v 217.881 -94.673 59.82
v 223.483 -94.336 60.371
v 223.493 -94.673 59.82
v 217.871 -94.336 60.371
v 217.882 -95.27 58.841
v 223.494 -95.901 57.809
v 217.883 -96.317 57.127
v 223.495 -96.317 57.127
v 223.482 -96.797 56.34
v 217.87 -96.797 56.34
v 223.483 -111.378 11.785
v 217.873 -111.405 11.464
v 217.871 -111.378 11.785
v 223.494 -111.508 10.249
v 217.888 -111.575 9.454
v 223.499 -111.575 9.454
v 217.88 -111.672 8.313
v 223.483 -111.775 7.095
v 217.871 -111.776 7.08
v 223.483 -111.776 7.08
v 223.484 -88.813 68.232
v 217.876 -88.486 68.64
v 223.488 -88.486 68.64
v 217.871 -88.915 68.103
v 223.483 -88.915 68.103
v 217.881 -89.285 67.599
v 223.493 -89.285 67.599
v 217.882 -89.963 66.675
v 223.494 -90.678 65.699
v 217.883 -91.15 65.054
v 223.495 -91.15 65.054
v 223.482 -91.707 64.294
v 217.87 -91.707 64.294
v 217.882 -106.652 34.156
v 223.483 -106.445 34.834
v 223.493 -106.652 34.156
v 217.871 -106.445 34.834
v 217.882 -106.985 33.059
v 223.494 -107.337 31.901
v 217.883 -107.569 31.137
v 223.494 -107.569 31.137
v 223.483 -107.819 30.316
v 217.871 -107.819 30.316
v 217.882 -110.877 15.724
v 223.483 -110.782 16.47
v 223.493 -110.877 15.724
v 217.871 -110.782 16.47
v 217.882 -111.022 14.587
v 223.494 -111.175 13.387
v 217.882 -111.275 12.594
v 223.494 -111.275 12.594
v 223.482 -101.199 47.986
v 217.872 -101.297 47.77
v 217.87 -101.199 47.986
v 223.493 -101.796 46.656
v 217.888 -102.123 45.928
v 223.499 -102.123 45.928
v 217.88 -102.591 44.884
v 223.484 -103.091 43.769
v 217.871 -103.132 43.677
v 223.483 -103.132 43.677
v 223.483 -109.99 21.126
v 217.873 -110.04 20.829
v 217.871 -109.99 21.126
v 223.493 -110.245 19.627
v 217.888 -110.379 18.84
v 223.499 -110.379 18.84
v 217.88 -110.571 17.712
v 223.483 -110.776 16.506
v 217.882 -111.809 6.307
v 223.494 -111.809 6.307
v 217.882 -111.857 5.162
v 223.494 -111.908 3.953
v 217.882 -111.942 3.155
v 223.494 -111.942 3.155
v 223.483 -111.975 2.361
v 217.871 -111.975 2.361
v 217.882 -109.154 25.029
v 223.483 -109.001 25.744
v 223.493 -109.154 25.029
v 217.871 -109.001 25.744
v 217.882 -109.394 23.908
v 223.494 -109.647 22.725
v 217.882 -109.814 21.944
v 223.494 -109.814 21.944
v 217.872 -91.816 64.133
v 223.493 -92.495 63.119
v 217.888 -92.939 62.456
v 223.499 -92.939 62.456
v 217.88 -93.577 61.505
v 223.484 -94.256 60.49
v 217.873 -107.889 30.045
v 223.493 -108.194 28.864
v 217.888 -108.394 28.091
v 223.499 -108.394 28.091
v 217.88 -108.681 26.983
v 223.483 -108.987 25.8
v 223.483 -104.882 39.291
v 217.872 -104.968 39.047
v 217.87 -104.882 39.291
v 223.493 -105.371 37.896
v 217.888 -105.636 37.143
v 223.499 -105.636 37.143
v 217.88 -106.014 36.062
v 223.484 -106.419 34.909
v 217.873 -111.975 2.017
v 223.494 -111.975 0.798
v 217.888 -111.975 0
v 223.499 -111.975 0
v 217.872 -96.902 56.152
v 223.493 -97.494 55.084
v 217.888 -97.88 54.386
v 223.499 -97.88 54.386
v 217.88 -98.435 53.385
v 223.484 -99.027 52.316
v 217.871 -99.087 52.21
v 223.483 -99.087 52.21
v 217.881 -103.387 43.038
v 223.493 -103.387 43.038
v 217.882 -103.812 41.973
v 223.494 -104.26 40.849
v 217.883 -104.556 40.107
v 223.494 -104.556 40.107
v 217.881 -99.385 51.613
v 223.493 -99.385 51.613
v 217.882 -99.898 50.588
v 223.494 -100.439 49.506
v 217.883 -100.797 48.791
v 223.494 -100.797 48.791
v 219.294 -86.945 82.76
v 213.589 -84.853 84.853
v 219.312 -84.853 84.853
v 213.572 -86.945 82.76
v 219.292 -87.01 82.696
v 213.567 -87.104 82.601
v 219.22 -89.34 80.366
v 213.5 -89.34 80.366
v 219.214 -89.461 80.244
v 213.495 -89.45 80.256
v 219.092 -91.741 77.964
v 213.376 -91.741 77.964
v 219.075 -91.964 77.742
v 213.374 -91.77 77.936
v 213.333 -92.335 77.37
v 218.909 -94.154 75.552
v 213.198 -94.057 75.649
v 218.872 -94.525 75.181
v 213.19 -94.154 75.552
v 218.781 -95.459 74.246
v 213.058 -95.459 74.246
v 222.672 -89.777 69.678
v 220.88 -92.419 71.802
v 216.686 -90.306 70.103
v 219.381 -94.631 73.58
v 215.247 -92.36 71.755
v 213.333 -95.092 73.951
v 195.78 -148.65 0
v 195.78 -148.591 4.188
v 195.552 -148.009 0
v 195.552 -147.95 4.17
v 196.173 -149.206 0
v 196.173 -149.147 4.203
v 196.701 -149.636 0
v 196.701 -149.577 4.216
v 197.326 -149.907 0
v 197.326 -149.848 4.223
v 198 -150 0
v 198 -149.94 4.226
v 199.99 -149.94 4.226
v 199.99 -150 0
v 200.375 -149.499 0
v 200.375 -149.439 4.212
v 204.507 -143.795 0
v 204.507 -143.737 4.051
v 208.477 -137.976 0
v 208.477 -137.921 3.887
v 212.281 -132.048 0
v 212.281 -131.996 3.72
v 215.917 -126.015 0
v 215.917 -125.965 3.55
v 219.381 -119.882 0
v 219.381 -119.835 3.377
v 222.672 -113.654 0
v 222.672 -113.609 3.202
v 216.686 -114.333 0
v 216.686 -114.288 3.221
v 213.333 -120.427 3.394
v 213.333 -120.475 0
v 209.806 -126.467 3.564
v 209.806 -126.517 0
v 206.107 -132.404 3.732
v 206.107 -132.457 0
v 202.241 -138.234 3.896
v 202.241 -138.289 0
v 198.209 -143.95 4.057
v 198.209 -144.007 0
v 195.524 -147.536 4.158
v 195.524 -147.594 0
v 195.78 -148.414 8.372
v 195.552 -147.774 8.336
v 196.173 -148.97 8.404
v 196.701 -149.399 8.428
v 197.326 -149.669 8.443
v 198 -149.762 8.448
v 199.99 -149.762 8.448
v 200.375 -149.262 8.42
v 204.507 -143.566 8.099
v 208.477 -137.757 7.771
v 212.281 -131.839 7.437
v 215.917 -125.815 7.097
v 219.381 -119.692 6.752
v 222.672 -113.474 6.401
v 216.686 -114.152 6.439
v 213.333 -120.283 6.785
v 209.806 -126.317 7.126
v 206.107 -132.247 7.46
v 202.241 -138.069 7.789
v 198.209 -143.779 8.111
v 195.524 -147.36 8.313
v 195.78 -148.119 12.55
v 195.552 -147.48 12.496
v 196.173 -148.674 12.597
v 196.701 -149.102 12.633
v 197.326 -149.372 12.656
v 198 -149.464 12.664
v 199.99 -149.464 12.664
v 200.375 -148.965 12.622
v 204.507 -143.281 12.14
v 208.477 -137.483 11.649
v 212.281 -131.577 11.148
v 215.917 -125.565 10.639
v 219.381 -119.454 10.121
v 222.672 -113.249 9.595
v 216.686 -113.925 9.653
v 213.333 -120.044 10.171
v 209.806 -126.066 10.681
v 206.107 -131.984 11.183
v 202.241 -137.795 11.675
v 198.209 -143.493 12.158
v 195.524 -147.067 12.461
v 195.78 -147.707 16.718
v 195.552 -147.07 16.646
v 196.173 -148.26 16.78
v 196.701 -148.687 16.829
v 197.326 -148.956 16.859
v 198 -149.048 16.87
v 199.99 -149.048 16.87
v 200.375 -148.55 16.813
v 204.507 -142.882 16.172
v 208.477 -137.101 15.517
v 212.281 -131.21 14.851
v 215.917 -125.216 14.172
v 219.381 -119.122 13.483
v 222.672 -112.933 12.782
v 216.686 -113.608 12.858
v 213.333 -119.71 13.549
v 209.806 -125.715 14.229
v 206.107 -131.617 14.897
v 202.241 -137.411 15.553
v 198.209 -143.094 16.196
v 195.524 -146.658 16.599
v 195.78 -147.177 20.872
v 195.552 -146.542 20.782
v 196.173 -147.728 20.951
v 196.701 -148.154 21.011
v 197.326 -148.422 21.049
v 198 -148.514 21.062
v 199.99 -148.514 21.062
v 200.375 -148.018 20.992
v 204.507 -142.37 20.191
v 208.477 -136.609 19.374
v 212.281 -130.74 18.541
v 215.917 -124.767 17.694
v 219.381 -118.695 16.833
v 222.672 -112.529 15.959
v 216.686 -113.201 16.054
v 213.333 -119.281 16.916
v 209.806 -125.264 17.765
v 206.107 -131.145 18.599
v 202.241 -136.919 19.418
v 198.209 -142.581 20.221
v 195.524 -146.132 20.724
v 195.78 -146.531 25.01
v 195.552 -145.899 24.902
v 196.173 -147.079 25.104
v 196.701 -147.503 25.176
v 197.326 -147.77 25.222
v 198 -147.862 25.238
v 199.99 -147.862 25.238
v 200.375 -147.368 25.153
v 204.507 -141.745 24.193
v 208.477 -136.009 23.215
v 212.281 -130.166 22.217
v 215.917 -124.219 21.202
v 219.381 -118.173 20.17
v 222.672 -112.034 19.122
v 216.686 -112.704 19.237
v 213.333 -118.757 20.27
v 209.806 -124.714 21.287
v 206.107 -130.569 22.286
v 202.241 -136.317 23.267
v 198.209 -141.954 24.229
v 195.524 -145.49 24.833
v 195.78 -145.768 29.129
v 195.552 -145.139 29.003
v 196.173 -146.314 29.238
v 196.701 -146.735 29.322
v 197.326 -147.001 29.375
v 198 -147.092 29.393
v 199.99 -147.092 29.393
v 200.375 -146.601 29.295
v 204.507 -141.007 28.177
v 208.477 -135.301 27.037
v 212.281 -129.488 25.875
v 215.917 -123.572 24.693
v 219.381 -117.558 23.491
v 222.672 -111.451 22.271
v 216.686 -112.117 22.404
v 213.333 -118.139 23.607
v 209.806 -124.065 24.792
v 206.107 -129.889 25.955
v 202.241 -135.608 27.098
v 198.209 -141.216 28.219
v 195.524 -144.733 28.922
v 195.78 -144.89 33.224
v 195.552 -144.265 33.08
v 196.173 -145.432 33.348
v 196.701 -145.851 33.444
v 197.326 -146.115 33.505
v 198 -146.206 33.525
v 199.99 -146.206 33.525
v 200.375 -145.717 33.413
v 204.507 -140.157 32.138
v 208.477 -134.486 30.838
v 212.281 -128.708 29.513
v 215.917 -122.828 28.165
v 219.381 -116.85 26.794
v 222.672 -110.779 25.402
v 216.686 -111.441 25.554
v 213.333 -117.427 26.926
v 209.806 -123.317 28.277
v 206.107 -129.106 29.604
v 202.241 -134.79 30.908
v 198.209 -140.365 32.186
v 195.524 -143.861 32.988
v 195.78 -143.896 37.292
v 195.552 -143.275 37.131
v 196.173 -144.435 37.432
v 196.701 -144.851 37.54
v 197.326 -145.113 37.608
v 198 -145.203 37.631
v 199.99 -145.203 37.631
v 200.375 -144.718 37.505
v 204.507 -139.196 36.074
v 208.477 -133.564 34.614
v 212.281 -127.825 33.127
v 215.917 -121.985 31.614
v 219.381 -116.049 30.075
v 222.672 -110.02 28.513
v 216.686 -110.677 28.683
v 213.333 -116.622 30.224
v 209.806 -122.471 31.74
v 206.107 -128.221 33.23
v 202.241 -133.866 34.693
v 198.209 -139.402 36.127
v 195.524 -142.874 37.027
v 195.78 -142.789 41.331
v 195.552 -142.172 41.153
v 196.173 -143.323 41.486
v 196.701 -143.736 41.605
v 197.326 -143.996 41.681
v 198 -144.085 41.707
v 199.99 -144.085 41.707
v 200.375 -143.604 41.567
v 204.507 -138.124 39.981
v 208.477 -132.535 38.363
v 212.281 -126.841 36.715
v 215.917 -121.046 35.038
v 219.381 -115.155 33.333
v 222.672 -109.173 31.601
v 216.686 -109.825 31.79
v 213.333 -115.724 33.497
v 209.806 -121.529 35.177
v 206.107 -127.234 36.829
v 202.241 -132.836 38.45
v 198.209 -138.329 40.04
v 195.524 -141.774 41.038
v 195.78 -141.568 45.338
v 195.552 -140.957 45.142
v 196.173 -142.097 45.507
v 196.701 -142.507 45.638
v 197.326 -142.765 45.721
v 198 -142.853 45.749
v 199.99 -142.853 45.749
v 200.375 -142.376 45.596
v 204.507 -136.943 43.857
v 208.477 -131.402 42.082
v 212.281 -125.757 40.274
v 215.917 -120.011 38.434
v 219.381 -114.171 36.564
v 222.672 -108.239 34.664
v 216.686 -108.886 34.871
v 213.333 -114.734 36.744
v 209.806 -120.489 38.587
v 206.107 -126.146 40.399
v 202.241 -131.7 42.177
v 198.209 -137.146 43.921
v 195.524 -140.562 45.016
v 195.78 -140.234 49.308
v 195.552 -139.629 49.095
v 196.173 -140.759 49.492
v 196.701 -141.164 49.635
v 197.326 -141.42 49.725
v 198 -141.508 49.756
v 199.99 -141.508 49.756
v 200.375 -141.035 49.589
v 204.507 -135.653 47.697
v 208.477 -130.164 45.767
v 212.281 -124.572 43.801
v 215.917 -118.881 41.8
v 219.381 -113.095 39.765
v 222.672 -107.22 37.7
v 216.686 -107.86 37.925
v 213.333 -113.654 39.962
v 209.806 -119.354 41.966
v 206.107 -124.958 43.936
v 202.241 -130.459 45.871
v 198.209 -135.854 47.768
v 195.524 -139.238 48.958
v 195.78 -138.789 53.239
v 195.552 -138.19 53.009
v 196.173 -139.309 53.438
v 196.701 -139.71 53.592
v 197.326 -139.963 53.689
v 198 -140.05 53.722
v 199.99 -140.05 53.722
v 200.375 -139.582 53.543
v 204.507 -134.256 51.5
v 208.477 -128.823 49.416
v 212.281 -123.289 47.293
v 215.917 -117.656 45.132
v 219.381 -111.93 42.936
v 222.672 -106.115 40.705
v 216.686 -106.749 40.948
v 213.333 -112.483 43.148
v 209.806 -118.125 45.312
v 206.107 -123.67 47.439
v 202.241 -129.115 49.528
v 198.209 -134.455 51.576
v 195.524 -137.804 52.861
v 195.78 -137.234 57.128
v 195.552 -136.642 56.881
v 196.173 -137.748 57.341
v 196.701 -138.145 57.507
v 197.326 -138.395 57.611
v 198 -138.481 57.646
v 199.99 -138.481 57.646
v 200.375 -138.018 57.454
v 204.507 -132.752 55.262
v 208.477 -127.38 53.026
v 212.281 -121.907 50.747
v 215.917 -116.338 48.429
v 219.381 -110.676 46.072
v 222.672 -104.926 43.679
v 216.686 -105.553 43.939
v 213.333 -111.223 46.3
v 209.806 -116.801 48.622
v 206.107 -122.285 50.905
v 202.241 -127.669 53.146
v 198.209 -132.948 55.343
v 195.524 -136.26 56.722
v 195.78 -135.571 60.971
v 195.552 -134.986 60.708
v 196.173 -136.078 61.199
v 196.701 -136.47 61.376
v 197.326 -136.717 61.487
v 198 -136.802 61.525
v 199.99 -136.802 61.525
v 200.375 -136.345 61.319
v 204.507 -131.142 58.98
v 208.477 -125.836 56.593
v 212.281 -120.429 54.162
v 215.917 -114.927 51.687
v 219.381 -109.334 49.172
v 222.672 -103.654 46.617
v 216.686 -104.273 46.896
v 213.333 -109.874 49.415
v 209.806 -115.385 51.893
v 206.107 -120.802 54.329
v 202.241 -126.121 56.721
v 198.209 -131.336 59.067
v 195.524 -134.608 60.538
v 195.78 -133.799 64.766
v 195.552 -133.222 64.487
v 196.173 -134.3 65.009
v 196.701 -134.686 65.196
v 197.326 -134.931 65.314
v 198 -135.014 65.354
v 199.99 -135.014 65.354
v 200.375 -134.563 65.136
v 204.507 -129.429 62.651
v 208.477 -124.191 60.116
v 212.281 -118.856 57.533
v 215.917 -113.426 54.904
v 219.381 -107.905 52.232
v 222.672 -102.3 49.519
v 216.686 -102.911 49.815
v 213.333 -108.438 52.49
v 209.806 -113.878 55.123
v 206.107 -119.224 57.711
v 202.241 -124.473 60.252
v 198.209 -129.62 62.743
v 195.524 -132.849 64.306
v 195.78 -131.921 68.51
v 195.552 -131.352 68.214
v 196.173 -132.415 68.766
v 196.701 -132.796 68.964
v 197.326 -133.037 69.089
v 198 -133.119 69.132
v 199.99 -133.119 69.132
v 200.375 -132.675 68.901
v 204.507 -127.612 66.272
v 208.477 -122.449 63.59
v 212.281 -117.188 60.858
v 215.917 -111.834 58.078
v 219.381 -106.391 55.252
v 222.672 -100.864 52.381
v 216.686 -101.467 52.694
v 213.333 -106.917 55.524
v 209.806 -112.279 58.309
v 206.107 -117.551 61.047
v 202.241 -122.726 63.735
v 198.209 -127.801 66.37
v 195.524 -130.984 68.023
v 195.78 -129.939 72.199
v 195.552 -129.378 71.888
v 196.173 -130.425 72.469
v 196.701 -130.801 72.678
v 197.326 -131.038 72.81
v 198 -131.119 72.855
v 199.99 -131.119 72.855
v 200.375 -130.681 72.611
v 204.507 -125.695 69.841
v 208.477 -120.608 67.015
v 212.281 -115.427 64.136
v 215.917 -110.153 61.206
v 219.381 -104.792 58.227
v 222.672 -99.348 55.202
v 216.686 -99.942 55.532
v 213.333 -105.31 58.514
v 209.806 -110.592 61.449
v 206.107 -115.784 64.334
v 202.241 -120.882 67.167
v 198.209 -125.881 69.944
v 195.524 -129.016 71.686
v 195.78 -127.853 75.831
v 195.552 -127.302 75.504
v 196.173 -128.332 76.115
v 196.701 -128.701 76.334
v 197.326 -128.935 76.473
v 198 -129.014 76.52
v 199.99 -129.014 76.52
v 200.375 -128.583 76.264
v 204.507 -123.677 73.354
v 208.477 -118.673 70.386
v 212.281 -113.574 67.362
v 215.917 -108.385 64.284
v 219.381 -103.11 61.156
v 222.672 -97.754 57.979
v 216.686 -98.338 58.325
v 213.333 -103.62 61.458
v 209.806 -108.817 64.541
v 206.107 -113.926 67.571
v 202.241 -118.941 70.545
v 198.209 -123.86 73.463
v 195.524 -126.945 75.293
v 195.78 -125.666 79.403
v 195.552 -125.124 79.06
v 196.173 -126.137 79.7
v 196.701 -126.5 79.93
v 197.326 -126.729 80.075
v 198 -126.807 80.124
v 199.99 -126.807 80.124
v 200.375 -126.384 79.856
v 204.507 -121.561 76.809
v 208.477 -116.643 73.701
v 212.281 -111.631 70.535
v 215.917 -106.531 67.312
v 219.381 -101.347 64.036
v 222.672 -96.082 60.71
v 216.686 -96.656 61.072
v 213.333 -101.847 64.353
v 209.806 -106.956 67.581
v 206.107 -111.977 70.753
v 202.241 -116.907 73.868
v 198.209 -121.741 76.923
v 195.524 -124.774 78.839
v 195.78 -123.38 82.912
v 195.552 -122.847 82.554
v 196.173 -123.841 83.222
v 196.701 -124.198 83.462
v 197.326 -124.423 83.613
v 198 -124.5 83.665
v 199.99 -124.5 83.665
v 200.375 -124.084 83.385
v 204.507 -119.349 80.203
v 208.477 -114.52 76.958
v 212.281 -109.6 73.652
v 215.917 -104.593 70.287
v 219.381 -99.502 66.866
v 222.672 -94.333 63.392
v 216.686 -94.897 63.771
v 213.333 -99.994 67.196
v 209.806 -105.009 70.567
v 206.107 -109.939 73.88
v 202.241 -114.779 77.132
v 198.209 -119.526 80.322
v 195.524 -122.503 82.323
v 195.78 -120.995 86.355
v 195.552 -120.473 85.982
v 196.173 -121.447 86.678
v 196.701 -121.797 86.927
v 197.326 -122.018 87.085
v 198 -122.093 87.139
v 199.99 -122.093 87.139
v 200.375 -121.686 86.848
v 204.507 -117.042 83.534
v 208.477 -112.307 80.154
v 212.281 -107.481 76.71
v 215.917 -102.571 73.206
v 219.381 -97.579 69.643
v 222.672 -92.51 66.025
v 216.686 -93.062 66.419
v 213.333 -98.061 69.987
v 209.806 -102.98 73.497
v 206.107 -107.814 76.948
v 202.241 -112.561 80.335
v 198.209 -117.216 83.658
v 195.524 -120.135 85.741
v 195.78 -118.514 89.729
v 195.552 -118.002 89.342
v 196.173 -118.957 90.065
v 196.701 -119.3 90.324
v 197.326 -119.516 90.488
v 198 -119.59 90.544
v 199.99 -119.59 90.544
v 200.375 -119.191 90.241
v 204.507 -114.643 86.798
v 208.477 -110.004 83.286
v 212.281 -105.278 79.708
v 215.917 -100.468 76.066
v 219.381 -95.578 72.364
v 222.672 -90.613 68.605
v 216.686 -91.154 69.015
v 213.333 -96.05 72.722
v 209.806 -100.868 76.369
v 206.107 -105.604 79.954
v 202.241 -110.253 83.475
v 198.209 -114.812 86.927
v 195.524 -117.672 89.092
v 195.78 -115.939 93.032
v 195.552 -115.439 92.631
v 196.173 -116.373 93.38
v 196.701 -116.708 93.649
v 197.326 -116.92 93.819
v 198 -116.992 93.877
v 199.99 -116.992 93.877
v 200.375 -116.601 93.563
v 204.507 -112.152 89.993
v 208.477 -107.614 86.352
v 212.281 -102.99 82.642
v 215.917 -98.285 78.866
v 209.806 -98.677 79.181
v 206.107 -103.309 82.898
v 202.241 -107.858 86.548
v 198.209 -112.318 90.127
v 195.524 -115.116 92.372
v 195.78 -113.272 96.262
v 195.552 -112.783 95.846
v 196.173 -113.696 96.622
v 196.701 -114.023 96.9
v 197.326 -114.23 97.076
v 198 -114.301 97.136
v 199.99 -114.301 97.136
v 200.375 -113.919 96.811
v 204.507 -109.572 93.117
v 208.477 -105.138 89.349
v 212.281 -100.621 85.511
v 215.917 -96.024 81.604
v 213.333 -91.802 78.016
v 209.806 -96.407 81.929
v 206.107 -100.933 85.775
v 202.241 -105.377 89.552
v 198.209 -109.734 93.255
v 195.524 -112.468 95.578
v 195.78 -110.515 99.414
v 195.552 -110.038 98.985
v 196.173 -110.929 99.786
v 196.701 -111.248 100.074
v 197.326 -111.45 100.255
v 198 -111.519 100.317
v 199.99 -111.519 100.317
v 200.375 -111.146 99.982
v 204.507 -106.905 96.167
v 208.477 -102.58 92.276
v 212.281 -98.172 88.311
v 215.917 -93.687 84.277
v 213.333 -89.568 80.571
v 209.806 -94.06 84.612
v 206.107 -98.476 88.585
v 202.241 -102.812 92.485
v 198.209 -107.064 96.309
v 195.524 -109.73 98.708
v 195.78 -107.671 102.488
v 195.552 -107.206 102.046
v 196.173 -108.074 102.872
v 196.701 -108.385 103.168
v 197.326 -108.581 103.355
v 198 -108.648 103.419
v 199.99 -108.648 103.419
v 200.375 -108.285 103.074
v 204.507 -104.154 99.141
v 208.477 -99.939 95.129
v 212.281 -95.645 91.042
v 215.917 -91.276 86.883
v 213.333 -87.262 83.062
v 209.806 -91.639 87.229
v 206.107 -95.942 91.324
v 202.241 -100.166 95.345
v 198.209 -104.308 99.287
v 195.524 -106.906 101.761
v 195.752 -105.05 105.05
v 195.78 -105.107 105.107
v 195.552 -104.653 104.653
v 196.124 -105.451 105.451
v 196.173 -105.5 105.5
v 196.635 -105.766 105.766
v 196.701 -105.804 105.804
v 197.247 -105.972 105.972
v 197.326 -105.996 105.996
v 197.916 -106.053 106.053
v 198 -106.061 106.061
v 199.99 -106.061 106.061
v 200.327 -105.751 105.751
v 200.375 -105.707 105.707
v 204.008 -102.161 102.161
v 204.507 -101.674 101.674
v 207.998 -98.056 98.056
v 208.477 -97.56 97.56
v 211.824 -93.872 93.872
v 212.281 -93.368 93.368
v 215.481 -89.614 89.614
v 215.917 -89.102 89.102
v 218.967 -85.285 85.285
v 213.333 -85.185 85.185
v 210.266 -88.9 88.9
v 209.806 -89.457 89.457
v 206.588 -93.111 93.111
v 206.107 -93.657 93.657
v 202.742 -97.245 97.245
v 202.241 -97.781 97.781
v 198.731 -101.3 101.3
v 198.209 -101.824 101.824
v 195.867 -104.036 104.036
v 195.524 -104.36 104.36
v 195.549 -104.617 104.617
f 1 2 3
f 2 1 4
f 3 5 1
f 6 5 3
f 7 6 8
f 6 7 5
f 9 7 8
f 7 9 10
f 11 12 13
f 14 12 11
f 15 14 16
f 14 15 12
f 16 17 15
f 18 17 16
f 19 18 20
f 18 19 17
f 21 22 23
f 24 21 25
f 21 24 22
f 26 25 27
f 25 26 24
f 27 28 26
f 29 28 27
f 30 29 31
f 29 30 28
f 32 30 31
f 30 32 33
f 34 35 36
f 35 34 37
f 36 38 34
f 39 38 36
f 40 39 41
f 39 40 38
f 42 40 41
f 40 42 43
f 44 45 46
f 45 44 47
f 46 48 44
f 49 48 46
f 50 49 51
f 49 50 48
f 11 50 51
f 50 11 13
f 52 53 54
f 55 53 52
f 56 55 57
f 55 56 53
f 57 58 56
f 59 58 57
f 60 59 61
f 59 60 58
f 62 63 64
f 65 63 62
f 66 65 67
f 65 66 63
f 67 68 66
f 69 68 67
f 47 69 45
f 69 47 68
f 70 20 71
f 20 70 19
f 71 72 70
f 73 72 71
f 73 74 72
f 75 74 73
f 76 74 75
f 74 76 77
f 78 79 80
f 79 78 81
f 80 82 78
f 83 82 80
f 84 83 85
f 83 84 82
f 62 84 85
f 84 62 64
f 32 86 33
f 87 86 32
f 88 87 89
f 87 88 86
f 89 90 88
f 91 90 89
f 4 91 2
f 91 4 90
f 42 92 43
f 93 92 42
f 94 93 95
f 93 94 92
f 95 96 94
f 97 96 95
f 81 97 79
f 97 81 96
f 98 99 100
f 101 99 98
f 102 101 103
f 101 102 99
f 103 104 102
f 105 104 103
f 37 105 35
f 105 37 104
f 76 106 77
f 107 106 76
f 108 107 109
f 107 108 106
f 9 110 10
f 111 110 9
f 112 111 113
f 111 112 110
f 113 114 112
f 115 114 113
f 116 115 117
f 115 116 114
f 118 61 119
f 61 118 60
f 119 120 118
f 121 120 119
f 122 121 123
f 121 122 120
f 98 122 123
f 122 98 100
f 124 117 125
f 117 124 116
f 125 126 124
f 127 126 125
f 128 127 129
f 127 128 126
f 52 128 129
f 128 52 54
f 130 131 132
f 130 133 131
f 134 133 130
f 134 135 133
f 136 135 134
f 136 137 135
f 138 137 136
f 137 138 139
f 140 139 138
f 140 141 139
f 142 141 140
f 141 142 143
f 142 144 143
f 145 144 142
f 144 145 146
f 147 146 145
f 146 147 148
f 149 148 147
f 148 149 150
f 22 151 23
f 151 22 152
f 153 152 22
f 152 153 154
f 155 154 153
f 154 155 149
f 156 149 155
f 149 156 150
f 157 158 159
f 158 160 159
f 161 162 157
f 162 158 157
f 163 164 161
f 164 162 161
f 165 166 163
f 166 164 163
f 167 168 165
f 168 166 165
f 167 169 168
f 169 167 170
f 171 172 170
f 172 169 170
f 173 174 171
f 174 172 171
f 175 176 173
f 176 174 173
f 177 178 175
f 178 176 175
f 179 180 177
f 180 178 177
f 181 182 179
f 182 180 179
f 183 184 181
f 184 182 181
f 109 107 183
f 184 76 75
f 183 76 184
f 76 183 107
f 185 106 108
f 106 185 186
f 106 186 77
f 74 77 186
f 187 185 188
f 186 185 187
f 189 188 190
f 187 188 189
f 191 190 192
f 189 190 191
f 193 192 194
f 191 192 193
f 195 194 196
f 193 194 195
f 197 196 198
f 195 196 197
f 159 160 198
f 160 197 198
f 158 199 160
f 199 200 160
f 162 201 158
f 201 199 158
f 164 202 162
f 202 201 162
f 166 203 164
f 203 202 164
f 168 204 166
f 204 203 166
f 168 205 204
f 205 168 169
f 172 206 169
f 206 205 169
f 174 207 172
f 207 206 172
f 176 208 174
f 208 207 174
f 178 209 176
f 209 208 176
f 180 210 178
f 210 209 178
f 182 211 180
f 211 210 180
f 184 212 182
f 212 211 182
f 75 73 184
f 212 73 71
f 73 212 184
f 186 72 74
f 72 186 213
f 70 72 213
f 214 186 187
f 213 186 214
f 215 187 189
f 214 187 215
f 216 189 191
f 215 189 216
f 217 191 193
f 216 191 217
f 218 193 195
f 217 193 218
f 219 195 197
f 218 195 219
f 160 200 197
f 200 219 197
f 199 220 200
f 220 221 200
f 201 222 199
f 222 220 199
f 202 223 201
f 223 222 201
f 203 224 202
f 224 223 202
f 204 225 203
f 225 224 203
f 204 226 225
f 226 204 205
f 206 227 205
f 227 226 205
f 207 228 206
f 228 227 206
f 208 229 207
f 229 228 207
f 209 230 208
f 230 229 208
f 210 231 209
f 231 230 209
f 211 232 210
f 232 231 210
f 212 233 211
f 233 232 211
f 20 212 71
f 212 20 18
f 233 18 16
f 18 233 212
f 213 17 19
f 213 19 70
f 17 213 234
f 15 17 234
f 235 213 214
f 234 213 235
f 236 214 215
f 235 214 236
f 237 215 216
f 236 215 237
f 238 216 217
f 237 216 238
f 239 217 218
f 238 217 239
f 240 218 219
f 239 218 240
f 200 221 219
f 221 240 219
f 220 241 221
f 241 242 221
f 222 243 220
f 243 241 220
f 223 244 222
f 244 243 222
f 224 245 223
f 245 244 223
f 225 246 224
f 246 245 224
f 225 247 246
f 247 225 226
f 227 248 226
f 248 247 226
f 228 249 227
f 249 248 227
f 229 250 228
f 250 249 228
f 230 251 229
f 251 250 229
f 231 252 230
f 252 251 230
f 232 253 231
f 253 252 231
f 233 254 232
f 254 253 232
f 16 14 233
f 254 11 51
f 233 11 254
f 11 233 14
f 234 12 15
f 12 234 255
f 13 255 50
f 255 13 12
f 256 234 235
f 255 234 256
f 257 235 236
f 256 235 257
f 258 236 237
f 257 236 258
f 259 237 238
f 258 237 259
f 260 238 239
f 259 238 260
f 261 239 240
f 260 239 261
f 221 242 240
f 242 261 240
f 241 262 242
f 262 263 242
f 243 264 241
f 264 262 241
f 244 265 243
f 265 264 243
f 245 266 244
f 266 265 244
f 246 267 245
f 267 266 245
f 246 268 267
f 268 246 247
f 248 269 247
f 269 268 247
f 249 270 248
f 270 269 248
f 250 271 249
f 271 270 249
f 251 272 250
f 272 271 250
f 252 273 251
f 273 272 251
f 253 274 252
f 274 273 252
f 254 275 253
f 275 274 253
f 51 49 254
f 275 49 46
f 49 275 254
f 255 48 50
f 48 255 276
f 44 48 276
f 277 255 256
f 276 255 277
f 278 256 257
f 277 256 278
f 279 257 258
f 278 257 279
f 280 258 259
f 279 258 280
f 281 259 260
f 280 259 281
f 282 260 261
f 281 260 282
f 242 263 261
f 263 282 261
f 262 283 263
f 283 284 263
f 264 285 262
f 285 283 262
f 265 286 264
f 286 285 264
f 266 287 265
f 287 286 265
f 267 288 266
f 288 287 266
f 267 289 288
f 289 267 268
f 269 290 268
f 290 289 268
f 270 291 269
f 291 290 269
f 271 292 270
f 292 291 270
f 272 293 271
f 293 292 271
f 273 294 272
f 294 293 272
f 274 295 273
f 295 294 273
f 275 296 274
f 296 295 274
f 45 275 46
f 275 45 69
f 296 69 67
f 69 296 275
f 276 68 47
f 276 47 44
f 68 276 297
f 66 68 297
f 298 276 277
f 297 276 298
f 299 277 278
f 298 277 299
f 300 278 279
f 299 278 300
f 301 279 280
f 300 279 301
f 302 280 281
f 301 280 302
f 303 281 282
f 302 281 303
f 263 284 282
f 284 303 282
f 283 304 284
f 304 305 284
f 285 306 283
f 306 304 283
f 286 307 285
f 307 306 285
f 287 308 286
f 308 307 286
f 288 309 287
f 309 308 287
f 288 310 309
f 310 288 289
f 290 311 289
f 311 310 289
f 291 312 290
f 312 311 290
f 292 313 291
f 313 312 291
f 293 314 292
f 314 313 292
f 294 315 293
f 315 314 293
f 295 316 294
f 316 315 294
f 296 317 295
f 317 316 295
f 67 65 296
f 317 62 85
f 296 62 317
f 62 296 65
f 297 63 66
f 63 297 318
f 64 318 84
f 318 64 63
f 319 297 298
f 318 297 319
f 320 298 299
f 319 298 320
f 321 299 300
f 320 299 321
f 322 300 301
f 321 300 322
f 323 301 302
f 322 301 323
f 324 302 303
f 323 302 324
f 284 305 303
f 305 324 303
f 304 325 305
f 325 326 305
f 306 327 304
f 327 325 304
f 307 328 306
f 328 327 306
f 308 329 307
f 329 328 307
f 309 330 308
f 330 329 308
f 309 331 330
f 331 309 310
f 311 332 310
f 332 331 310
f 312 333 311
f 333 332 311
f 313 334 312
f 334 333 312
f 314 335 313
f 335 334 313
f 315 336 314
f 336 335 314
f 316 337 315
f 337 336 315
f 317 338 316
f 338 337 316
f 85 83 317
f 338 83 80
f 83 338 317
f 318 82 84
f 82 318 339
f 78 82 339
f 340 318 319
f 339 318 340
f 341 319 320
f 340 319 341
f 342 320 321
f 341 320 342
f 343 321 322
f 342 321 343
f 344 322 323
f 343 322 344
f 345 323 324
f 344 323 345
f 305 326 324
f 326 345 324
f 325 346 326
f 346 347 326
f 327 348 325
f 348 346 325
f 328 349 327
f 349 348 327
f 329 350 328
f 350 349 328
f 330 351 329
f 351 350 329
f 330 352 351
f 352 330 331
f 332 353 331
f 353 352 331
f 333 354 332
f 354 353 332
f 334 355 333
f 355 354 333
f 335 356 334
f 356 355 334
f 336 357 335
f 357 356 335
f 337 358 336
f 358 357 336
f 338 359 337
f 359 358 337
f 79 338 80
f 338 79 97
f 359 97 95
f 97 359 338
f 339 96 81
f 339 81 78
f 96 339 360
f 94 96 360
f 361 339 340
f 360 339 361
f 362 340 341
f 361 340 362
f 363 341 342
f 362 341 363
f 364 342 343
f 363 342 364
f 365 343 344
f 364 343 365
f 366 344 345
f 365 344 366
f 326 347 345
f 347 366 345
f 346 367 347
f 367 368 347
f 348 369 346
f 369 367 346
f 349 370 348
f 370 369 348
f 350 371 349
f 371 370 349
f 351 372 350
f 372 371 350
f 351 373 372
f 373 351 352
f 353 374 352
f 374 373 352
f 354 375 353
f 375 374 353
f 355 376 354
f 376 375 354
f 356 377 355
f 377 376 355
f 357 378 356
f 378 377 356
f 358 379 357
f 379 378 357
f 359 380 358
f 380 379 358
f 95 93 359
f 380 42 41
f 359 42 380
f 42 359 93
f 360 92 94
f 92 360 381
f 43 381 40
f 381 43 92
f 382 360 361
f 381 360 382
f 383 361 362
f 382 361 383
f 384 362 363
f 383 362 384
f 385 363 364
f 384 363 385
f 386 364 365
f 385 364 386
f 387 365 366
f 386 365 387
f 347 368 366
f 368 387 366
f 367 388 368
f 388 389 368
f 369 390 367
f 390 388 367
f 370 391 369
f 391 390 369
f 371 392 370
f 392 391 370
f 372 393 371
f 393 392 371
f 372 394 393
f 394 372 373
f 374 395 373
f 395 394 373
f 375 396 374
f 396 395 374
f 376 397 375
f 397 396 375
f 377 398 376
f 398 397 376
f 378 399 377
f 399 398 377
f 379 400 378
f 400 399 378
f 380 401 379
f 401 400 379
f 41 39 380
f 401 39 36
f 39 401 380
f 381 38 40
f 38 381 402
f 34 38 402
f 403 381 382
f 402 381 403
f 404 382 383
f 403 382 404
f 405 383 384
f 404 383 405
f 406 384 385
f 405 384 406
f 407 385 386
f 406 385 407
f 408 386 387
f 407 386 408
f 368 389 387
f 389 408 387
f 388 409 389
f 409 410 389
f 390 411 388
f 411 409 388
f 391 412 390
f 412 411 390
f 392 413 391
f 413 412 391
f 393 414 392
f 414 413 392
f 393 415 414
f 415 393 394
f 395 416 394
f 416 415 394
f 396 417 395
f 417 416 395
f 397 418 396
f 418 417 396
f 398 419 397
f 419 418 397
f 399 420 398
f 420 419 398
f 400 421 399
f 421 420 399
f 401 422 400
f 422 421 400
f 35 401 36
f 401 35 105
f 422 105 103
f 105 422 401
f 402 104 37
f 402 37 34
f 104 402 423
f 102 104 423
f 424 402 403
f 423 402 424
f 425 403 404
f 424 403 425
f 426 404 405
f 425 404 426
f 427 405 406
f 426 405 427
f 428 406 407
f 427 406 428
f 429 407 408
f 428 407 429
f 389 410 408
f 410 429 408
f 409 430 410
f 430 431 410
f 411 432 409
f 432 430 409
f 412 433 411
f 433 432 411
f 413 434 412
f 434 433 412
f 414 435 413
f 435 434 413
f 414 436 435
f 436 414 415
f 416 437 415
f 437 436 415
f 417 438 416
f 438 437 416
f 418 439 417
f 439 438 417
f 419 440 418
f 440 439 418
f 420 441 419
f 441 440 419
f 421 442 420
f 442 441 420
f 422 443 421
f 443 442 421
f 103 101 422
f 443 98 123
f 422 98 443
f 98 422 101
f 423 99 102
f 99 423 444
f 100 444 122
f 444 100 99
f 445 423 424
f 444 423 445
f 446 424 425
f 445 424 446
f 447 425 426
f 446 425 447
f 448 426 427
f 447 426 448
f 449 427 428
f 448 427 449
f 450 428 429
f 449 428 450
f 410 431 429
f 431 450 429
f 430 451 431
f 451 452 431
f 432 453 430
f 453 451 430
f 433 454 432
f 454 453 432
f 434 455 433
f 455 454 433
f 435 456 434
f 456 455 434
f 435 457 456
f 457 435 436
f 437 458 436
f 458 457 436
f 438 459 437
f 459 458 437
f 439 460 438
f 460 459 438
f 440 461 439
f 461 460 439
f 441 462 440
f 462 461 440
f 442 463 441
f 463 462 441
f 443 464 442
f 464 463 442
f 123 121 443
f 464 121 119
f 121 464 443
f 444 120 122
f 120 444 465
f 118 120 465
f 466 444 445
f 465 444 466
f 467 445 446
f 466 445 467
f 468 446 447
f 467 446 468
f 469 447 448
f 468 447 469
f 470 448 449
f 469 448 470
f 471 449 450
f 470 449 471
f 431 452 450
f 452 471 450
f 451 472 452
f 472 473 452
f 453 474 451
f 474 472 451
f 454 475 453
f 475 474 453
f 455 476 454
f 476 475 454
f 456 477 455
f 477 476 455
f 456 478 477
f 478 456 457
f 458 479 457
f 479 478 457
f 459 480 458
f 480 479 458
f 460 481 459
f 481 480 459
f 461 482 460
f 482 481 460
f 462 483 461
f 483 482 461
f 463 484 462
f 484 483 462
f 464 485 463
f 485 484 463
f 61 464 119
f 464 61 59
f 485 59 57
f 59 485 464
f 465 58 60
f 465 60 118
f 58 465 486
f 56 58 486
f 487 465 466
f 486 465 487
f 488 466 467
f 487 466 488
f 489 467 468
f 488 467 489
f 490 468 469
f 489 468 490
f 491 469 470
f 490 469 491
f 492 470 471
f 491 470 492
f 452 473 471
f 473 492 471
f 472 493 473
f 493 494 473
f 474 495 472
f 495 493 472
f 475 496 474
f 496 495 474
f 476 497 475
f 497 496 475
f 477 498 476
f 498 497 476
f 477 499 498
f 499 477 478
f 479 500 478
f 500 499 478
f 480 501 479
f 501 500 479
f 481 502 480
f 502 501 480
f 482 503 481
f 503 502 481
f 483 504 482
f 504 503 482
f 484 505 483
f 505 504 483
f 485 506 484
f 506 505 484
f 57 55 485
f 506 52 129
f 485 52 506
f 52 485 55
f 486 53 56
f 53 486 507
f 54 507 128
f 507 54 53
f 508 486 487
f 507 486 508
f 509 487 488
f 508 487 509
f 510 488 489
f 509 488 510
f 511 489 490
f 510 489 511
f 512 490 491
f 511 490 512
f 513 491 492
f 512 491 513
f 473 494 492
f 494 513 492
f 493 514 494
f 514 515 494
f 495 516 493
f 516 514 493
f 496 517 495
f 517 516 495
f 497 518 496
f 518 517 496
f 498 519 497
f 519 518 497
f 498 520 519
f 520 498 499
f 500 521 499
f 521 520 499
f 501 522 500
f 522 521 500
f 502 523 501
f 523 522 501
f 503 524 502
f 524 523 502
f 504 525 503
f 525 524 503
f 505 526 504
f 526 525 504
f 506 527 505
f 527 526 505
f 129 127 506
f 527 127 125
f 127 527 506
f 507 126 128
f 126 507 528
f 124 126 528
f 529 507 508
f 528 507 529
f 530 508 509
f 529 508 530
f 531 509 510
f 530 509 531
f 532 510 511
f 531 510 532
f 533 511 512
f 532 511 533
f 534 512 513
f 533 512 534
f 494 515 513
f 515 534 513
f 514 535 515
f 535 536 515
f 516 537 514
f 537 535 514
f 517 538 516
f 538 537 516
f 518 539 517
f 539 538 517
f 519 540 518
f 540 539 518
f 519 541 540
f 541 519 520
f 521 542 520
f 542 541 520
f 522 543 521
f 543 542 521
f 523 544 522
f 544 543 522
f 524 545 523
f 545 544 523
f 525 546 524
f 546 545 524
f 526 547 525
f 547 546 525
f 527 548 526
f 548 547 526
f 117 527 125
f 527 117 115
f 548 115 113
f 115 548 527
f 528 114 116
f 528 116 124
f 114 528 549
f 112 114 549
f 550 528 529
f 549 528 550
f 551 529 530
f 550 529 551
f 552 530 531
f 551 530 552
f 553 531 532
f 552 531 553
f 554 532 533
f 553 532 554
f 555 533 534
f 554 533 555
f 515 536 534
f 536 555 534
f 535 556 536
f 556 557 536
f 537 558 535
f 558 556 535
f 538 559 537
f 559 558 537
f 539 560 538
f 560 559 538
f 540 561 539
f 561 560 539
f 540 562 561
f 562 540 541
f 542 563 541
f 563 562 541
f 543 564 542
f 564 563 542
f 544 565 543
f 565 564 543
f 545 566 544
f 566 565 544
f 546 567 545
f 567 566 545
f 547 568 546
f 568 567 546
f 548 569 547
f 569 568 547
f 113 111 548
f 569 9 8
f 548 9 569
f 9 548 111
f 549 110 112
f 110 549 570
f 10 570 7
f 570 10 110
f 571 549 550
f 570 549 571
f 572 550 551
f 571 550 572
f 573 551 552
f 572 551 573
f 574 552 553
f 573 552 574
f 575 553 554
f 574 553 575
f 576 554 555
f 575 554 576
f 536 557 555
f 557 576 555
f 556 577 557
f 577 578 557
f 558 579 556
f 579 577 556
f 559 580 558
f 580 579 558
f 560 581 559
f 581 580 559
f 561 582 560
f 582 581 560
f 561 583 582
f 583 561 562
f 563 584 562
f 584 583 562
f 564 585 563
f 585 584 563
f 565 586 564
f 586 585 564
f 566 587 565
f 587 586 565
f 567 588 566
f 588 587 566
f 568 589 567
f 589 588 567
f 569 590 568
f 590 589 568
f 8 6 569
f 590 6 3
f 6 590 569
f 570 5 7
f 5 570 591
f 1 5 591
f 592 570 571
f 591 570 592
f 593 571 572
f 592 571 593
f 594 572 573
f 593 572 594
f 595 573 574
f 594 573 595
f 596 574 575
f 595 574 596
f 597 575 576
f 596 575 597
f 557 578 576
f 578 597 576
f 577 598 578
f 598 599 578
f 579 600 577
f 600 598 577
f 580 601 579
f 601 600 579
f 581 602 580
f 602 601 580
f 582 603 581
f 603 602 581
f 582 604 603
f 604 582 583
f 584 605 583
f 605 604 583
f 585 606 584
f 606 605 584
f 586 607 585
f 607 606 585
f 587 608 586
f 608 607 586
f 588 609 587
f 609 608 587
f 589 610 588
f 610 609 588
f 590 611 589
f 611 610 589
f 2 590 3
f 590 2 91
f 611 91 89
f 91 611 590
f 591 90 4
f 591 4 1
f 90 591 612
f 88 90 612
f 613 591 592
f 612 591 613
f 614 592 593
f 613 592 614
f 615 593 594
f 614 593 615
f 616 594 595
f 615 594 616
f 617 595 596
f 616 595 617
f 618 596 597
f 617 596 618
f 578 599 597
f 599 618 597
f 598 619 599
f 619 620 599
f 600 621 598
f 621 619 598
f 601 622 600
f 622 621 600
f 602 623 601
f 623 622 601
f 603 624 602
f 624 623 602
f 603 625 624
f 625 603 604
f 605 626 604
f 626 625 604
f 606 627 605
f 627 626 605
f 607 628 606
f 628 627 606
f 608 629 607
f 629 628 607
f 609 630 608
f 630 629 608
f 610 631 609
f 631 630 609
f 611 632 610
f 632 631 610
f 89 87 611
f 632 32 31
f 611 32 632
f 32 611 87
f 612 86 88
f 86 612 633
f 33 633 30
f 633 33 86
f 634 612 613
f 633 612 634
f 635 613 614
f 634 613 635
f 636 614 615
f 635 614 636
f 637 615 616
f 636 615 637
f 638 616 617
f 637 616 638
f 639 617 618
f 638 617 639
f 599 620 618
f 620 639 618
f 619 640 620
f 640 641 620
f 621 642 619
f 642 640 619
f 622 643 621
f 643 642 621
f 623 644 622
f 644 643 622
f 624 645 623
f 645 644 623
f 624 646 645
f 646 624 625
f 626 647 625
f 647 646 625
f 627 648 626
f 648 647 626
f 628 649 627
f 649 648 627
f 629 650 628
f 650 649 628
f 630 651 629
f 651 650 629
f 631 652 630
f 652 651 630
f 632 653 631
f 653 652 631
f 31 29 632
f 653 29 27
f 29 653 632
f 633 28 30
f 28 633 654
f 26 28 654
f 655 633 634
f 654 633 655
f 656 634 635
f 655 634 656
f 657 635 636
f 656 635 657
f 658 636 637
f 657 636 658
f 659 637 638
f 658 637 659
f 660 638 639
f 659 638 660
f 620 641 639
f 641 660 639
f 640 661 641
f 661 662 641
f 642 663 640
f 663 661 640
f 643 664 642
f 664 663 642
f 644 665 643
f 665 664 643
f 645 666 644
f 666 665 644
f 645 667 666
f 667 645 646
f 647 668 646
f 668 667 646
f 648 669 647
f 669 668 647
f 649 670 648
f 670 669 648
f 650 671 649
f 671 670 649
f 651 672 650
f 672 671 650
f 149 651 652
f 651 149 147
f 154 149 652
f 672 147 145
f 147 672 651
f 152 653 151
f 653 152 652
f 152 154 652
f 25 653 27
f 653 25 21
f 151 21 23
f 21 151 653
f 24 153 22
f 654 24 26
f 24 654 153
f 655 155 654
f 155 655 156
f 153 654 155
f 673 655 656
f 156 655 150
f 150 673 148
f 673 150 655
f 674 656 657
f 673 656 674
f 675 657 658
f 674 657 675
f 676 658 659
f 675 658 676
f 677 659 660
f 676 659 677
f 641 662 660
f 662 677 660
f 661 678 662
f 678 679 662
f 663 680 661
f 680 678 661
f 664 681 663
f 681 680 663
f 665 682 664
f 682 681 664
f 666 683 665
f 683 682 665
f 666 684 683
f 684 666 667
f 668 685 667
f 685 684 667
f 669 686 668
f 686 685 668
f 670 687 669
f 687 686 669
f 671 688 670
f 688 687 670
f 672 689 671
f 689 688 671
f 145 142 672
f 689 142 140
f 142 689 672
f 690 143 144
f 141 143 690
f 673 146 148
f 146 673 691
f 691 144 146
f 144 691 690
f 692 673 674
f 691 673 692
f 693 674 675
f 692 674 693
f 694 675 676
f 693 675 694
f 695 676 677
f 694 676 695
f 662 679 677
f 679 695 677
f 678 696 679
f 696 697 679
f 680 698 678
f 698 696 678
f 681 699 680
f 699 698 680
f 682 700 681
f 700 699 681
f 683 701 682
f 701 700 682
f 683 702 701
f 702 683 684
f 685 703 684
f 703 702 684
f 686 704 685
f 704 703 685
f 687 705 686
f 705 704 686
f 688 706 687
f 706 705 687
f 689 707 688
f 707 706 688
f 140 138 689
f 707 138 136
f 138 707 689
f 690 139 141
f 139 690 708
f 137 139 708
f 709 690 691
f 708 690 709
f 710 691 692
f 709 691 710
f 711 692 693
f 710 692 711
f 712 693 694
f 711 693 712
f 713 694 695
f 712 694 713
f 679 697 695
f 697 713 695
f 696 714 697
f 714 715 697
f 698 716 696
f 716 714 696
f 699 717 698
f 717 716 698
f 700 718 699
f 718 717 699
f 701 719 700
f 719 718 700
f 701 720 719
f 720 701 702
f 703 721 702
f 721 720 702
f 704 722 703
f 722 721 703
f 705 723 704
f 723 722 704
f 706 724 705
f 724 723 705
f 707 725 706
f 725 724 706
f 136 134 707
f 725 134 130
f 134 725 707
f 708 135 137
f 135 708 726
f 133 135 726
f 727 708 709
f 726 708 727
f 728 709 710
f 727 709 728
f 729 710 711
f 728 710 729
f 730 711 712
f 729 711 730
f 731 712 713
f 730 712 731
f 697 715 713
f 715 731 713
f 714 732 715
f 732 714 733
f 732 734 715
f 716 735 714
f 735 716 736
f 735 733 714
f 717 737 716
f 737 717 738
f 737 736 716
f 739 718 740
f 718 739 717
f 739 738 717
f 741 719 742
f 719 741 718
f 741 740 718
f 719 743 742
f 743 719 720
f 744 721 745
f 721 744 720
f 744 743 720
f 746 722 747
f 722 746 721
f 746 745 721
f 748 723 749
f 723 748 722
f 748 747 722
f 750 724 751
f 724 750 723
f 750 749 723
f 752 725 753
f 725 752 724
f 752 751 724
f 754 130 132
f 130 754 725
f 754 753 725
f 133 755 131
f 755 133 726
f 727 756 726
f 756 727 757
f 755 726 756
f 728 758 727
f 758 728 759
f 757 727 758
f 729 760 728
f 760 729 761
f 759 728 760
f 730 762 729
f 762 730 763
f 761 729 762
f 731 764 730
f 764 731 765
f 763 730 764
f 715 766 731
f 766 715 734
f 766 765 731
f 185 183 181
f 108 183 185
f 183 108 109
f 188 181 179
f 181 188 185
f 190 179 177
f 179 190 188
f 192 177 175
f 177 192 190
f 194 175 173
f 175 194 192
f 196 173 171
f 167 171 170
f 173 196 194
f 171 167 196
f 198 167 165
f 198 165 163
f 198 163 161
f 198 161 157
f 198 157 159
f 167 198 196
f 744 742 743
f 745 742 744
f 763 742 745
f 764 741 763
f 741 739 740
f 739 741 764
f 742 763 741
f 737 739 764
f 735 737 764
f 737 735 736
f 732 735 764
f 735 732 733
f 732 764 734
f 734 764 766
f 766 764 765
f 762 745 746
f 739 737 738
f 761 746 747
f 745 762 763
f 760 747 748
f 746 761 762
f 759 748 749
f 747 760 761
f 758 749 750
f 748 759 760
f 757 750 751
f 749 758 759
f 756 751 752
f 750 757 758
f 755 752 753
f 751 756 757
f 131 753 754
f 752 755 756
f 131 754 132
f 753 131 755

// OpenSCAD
// file: ../motors/MN5212.scad
use <../utils.scad>

module MN5212(){

	//render(){
		difference(){
			union(){
				translate([0,0, 42.5 / 2 - 23 / 2 - 4.9 - 6])
					cylinder(
						h = 23,
						r = 59 / 2,
						$fa = fa(59 / 2),
						center = true);
				translate([0,0, 42.5 / 2 - 4.9 / 2 - 6])
					cylinder(
						h = 4.9,
						r1 = 59 / 2,
						r2 = 24.8 / 2,
						$fa = fa(59 / 2),
						center = true);
				translate([0,0, - 42.5 / 2 + 5.6 / 2 + 3])
					cylinder(
						h = 5.6,
						r1 = 44 / 2,
						r2 = 59 / 2,
						$fa = fa(59 / 2),
						center = true);
				translate([0, 0, 42.5 / 2 - 3])
					cylinder(
						h = 6,
						r = 4 / 2,
						$fa = fa(4 / 2),
						center = true);
				translate([0, 0, - 42.5 / 2 + 1.5])
					cylinder(
						h = 3,
						r = 6 / 2,
						$fa = fa(6 / 2),
						center = true);
			}
			union(){
				for(i = [0:90:270])
					rotate([0, 0, i])
						translate([0, 25 / 2, -16.25 - 0.025])
							cylinder(
								h = 4,
								r = 3 / 2,
								$fa = fa(3 / 2),
								center = true);
				for(i = [0:120:240])
					rotate([0, 0, i])
						translate([0, 17 / 2, 12.75 + 0.025])
							cylinder(
								h = 5,
								r = 3 / 2,
								$fa = fa(3 / 2),
								center = true);
				rotate([0, 0, 30])
					translate([0, 12 / 2, 12.75 + 0.025])
						cylinder(
							h = 5,
							r = 3 / 2,
							$fa = fa(3 / 2),
							center = true);
				rotate([0, 0, 30 + 180])
					translate([0, 12 / 2, 12.75 + 0.025])
						cylinder(
							h = 5,
							r = 3 / 2,
							$fa = fa(3 / 2),
							center = true);
			}
		}

	//}

}

MN5212();
// file: ../servos/TGY_4805_2PA.scad
use <../utils.scad>

module TGY_4805_2PA(){

	length = 40;
	width = 20;
	depth = 36.4;
	wing_width = 58;
	wing_thick = 2.45;
	wing_height = 27.7;
	shaft_offset = 9.5;
	hole_seperation = 9.2;
	hole_spacing = 50;
	shaft_height = 40;
	shaft_length = 3.6;
	hole_diameter = 4.8;

	module mounting_hole(){
		mh_rad = hole_diameter / 2;
		translate(
			[
				hole_spacing / 2,
				0,
				-depth / 2 + wing_height - wing_thick / 2
			])
			cylinder(h = 5, r = mh_rad, $fa = fa(mh_rad), center = true);
	}

	difference(){
		union(){
			cube([length, width, depth], center = true);
			translate([0, 0, -depth / 2 + wing_height - wing_thick / 2])
				cube([wing_width, width, wing_thick], center = true);
			translate(
				[
					- length / 2 + shaft_offset,
					0,
					shaft_height - length / 2 + shaft_length / 2
				])
				cylinder(
					h = shaft_length,
					r = 1.5,
					$fa = fa(1.5),
					center = true);
		}	union(){

			translate([0, hole_seperation / 2, 0]){
				mounting_hole();
				mirror() mounting_hole();
			}
			translate([0, -hole_seperation / 2, 0]){
				mounting_hole();
				mirror() mounting_hole();
			}
		}
	}
}

module TGY_4805_2PA_translate(){
	length = 40;
	shaft_offset = 9.5;
	shaft_height = 40;
	shaft_length = 3.6;
	translate(
		[
				- length / 2 + shaft_offset,
				0,
				shaft_height - length / 2 + shaft_length / 2
		]) children();
}

TGY_4805_2PA();
// file: ../servos/HS_5065MG.scad
use <../utils.scad>

module HS_5065MG(){

	length = 23.75;
	width = 11.68;
	depth = 20.32;
	wing_width = 32.38;
	wing_thick = 2;
	wing_offset = 1;
	shaft_offset = 6;
	hole_spacing = 28.32;
	hole_spacing_2 = 27;
	hole_2_wide = 6;
	hole_diameter = 2;
	shaft_height = 26.16;
	shaft_length = 2;

	module mounting_hole(){
		mh_rad = hole_diameter / 2;
		translate(
			[
				hole_spacing / 2,
				0,
				depth / 2 - wing_thick / 2
			])
			cylinder(h = 5, r = mh_rad, $fa = fa(mh_rad), center = true);
		translate(
			[
				hole_spacing_2 / 2,
				hole_2_wide / 2,
				depth / 2 - wing_thick / 2
			])
			cylinder(h = 5, r = mh_rad, $fa = fa(mh_rad), center = true);
		translate(
			[
				hole_spacing_2 / 2,
				- hole_2_wide / 2,
				depth / 2 - wing_thick / 2
			])
			cylinder(h = 5, r = mh_rad, $fa = fa(mh_rad), center = true);
	}

	difference(){
		union(){
			cube([length, width, depth], center = true);
			translate([0, 0, depth / 2 - wing_thick / 2 - wing_offset])
				cube([wing_width, width, wing_thick], center = true);
			translate(
				[
					- length / 2 + shaft_offset,
					0,
					depth / 2 + 3.8 + 1.9 + shaft_length / 2
				])
				cylinder(
					h = shaft_length,
					r = 1.5,
					$fa = fa(1.5),
					center = true);
			translate(
				[
					- length / 2 + shaft_offset,
					0,
					depth / 2 + 3.8 / 2
				])
				cylinder(
					h = 3.8,
					r = 11.3 / 2,
					$fa = fa(11.3 / 2),
					center = true);
			translate(
				[
					- length / 2 + shaft_offset,
					0,
					depth / 2 + 3.8 + 1.9 / 2
				])
				cylinder(
					h = 1.9,
					r1 = 11.3 / 2,
					r2 = 8 / 2,
					$fa = fa(11.3 / 2),
					center = true);
		}	union(){

			mounting_hole();
			mirror() mounting_hole();
		}
	}
}

module HS_5065MG_arm(){

	hole_size = 1.5;
	hole_spacing = 3;
	hole_offset = 9.6;

	difference(){
		union(){
			translate([0, 0, 4.4 / 2])
				cylinder(
					h = 4.4,
					r = 8 / 2,
					$fa = fa(8 / 2),
					center = true);
			hull(){
				translate([0, 0, 4.4 - 1.8 / 2])
					cylinder(
						h = 1.8,
						r = 8 / 2,
						$fa = fa(8 / 2),
						center = true);
				translate([18.8, 0, 4.4 - 1.8 / 2])
					cylinder(
						h = 1.8,
						r = 5 / 2,
						$fa = fa(5 / 2),
						center = true);
			}
		}
		union(){
			for(i = [0:3]){
				translate([hole_offset + hole_spacing * i, 0, 4.4 - 1.8 / 2])
					cylinder(
						h = 5,
						r = hole_size / 2,
						$fa = fa(hole_size / 2),
						center = true);
			}
		}
	}
}

module HS_5065MG_shaft_translate(){
	translate(
		[
			- 23.75 / 2 + 6,
			0,
			20.32 / 2 + 3.8 + 1.9
		])
			children();
}

HS_5065MG();
HS_5065MG_shaft_translate() HS_5065MG_arm();
// file: ../servos/LS_0006_servo.scad
// Author Michael Marques (DrYerzinia)

use <../utils.scad>

module ls_0006_servo(){
	
	length = 21.4;
	depth = 19.9;
	thickness = 11.65;

	gear_height = 2.6;
	gear_bump_height = 0.7;
	gear_bump_diameter = 1.97;
	gear_outer_bump_diameter = 6;
	gear_bump_offset = 12.2;

	shaft_height = 2.4;
	shaft_diameter = 3.74;
	shaft_offset = thickness / 2;
	shaft_screw_diameter = 1.3;
	
	wing_outer_width = 8.5;
	wing_top_off = 3.8;
	wing_length = 3.8;
	wing_thickness = 1.2;
	wing_hole_diameter = 1.85;
	wing_hole_edge_dist = 2;

	module wing_hole(){
		translate(
			[
				length / 2 + wing_hole_edge_dist,
				0,
				depth/2 - wing_top_off - wing_thickness / 2
			])
			cylinder(
				h = wing_thickness + 1,
				r = wing_hole_diameter / 2,
				$fn = 16,
				center = true);
	}

	module wing(){
		translate(
			[
				length / 2,
				thickness / 2,
				depth/2 - wing_top_off - wing_thickness
			])
			rotate([0,0,-90])
				trapezoid(
					thickness,
					wing_outer_width,
					wing_length,
					wing_thickness);
	}

	// Body
	cube([length, thickness, depth], center = true);

	difference(){
		union(){

			wing();
			mirror() wing();

			// Gear Bumps
			translate([0, 0, depth/2 + gear_height / 2]){
				translate([length / 2 - gear_bump_offset, 0, 0])
					cylinder(
						h = gear_height,
						r = gear_outer_bump_diameter / 2,
						$fn = 16,
						center = true);
				translate([length / 2 - gear_bump_offset, 0, gear_height/2 + gear_bump_height / 2])
					cylinder(
						h = gear_bump_height,
						r = gear_bump_diameter / 2,
						$fn = 16,
						center = true);
				translate([length / 2 - shaft_offset, 0, 0])
					cylinder(
						h = gear_height,
						r = thickness / 2,
						$fn = 32,
						center = true);
				// Shaft
				translate([length / 2 - shaft_offset, 0, gear_height])
					cylinder(
						h = shaft_height,
						r = shaft_diameter / 2,
						$fn = 16,
						center = true);
			}

		}
		union(){

			wing_hole();
			mirror() wing_hole();

			// Shaft_hole
			translate(
				[
					length / 2 - shaft_offset,
					0,
					depth/2 + gear_height * (3 / 2) + 0.5])
				cylinder(
					h = shaft_height + 1,
					r = shaft_screw_diameter / 2,
					$fn = 16,
					center = true);

		}
	}

}

module translate_ls_0006_attachment(){

	length = 21.4;
	thickness = 11.65;
	shaft_offset = thickness / 2;
	depth = 19.9;
	float = 3.3;

	translate([length / 2 - shaft_offset, 0, depth / 2 + float])
		children();

}

module bar_attachment(){

	height = 3.75;
	bar_length = 14.7;
	bar_thickness = 1.6;
	inner_radius = 5.9;
	outer_radius = 3.95;
	shaft_diameter = 3.7;
	upper_void_diameter = 4.8;
	screw_diameter = 2;
	hole_spacing = 2;
	hole_4_diameter = 1.2;
	hole_diameter = 1;
	hole_start_off = 4.7;
	top_void_depth = 0.67;
	bottom_void_depth = 1.84;

	translate([0, 0, height / 2]){
		difference(){
			union(){

				translate([0, inner_radius / 2, height / 2 - bar_thickness])
					rotate([0,0,-90])
						trapezoid(
							inner_radius,
							outer_radius,
							bar_length,
							bar_thickness);

				cylinder(
					h = height,
					r = inner_radius / 2,
					$fn = 16,
					center = true);

				translate([bar_length, 0, height / 2 - bar_thickness / 2])
					cylinder(
						h = bar_thickness,
						r = outer_radius / 2,
						$fn = 16,
						center = true);

			}
			union(){
				// screwhole
				cylinder(
					h = height + 1,
					r = screw_diameter / 2,
					$fn = 16,
					center = true);
				// voids
				translate([0, 0, height / 2 - top_void_depth / 2 + 0.5])
					cylinder(
						h = top_void_depth + 1,
						r = upper_void_diameter / 2,
						$fn = 16,
						center = true);
				translate([0, 0,  - bottom_void_depth / 2 - 0.5])
					cylinder(
						h = bottom_void_depth + 1,
						r = shaft_diameter / 2,
						$fn = 16,
						center = true);

				for(i = [0:4]){
					dia = (i != 3) ? hole_diameter : hole_4_diameter;
					translate(
						[
							hole_start_off + hole_spacing * i,
							0,
							height / 2 - bar_thickness / 2])
						cylinder(
							h = bar_thickness + 1,
							r = dia / 2,
							$fn = 16,
							center = true);
				}

			}
		}
	}

}

ls_0006_servo();
translate_ls_0006_attachment() bar_attachment();
// file: ../servos/parallax_continuous_rotation_servo.scad
// Author Michael Marques (DrYerzinia)

module parallax_continuous_rotation_servo(){

	depth = 37.7;
	length = 40.75;
	width = 19.75;

	mount_height = 2.7;
	mount_extent = 6.1;
	mount_from_top = 7.7;

	mount_hole_diameter = 4.46;
	mount_hole_spacing = 14.4 - mount_hole_diameter;

	shaft_diameter = 5.8;
	shaft_offset = 10;
	shaft_length = 3.5;

	module mounting_hole(){

			translate(
				[
					length / 2 + 5,
					mount_hole_spacing / 2,
					depth / 2 - mount_height / 2 - mount_from_top
				]
				)
				cylinder(
					h = mount_height + 1,
					r = mount_hole_diameter / 2,
					$fn=16,
					center = true);
	}

	difference(){
		union(){

			// Body
			cube([length,width,depth], center = true);

			// Mounting wings
			translate(
				[
					0,
					0,
					depth / 2 - mount_height / 2 - mount_from_top
				])
				cube(
					[
						length + mount_extent * 2,
						width,
						mount_height
					],
					center = true);

			// Shaft
			translate(
				[
					length / 2 - shaft_offset,
					0,
					depth / 2 + shaft_length / 2
				]
				)
				cylinder(
					h = shaft_length,
					r = shaft_diameter / 2,
					$fn = 16,
					center = true
				);

		}
		union(){

			// Mounting Holes
			mounting_hole();
			mirror()
				mounting_hole();

			translate([0,-mount_hole_spacing,0]){
				mounting_hole();
				mirror()
					mounting_hole();
			}
		}
	}

}

module translate_shaft(){

	depth = 37.7;
	length = 40.75;

	shaft_offset = 10;

	translate(
		[
			length / 2 - shaft_offset,
			0,
			depth / 2
		])
		children();
}

module round_servo_attachment(){

	height = 6;
	diameter = 20.8;
	inner_diameter = 8.6;
	plate_thickness = 2.45;

	float = 2;

	depth = 37.7;
	length = 40.75;

	shaft_offset = 10;

	plate_hole_spacing = 14.5;
	plate_hole_diameter = 1.4;
	plate_hole_minor_spacing = 3.5;

	screw_hole_diameter = 3;

	inner_diameter = 8;
	
	top_depth = 1.8;
	bottom_depth = 3.4;

	void_diameter = 5.8;

	module plate_hole(){
		cylinder(
			h = plate_thickness + 1,
			r = plate_hole_diameter / 2,
			$fn = 16,
			center = true
		);
	}

	module plate_hole_group(){
		translate([0, 0, height / 2 - plate_thickness / 2]){
			translate([0, plate_hole_spacing / 2, 0]){
					plate_hole();
					translate([- plate_hole_minor_spacing, 0, 0])
						plate_hole();
					translate([  plate_hole_minor_spacing, 0, 0])
						plate_hole();
			}
		}
	}

	translate(
		[
			length / 2 - shaft_offset,
			0,
			depth / 2 + height / 2 + float
		]
		)
		difference(){

			union(){

				// inner shaft
				cylinder(
					h = height,
					r = inner_diameter / 2,
					$fn = 16,
					center = true
				);

				// top
				translate([0, 0, height / 2 - plate_thickness / 2])
					cylinder(
						h = plate_thickness,
						r = diameter / 2,
						$fn = 32,
						center = true
					);
			}

			union(){

				// plate holes
				for(ang = [0:3]){
					rotate([0,0, ang * 90])
						plate_hole_group();
				}

				// screw hole
				cylinder(
					h = height + 1,
					r = screw_hole_diameter / 2,
					$fn = 16,
					center = true
				);

				// inner voids
				translate([0, 0, height / 2 - top_depth / 2 + 1])
					cylinder(
						h = top_depth + 1,
						r = void_diameter / 2,
						$fn = 16,
						center = true
					);
				translate([0, 0, -1])
					cylinder(
						h = bottom_depth + 1,
						r = void_diameter / 2,
						$fn = 16,
						center = true
					);

			}

		}

}

parallax_continuous_rotation_servo();
round_servo_attachment();
// file: ../hardware.scad
 // Author Michael Marques (DrYerzinia)

// http://www.ebay.com/itm/10-PCS-683-3x7x2-mm-Metal-OPEN-PRECISION-Miniature-Ball-Bearing-3-7-2-/291206307942?hash=item43cd3fa066:m:mCi6eovrGVk_CjIUjlhw8yg
// E-Bay empire.rc

module washer_M3_7x3_2x0_5mm(){

	difference(){
		cylinder(
			h = 0.5,
			r = 7 / 2,
			$fn = 16,
			center = true);
		cylinder(
			h = 0.5 + 0.1,
			r = 3.2 / 2,
			$fn = 16,
			center = true);
	}

}

module bearing_3x7x2mm(){

	difference(){
		cylinder(
			h = 2,
			r = 7 / 2,
			$fn = 16,
			center = true);
		cylinder(
			h = 2 + 1,
			r = 3 / 2,
			$fn = 16,
			center = true);
	}

}

module bearing_5x8x2_5mm(){

	difference(){
		cylinder(
			h = 2.5,
			r = 8 / 2,
			$fn = 16,
			center = true);
		cylinder(
			h = 2.5 + 1,
			r = 5 / 2,
			$fn = 16,
			center = true);
	}

}

module bearing_8x16x5mm(){

	difference(){
		cylinder(
			h = 5,
			r = 16 / 2,
			$fn = 16,
			center = true);
		cylinder(
			h = 5 + 1,
			r = 8 / 2,
			$fn = 16,
			center = true);
	}

}


bearing_5x8x2_5mm();
// file: ../utils.scad
// http://forum.openscad.org/Creating-pie-pizza-slice-shape-need-a-dynamic-length-array-td3148.html

module pie_slice(r, start_angle, end_angle) {
    R = r * sqrt(2) + 1;
    a0 = (4 * start_angle + 0 * end_angle) / 4;
    a1 = (3 * start_angle + 1 * end_angle) / 4;
    a2 = (2 * start_angle + 2 * end_angle) / 4;
    a3 = (1 * start_angle + 3 * end_angle) / 4;
    a4 = (0 * start_angle + 4 * end_angle) / 4;
    if(end_angle > start_angle)
        intersection() {
        circle(r, $fa = fa(r));
        polygon([
            [0,0],
            [R * cos(a0), R * sin(a0)],
            [R * cos(a1), R * sin(a1)],
            [R * cos(a2), R * sin(a2)],
            [R * cos(a3), R * sin(a3)],
            [R * cos(a4), R * sin(a4)],
            [0,0]
       ]);
    }
}

// https://github.com/openscad/openscad/issues/29

module rotate_about(v,a) {
	translate(v) rotate(a) translate(-v) children();
}

module rotate_about_axis(v, ang, axis) {
	translate(v) rotate(ang, axis) translate(-v) children();
}

// https://github.com/robofun/openscad-utils/blob/master/trapezoid.scad

module trapezoid(width_base, width_top, height, thickness){

  linear_extrude(height = thickness)
			polygon(
				points =
					[
						[0,0],
						[width_base,0],
						[width_base-(width_base-width_top)/2,height],
						[(width_base-width_top)/2,height]
					],
					paths=[[0,1,2,3]]); 
  
}

// http://forum.openscad.org/fe-Tolerance-based-arc-approximation-td14212.html

function fa(r)=($fn>0)?360/$fn:($fe>0)?($fe<r)?min(45,2*acos(1-$fe/r)):45:$fa; 
// file: ../render_settings.scad
// Author Michael Marques (DrYerzinia)

// Lulzbot Mini tolerances
// x/y 0.1mm
// z   0.05mm
//
// 0.1mm   preview tolerance
// 0.025mm export  tolerance

$fs = 0.01;
$fn = undef;
$fa = 360 / 5;

$fe = 0.025;	// export
// main file
// Author Michael Marques (DrYerzinia)

include <../render_settings.scad>

use <../BB8.scad>

rotate([90, 0, 0])
	Door_P20();
